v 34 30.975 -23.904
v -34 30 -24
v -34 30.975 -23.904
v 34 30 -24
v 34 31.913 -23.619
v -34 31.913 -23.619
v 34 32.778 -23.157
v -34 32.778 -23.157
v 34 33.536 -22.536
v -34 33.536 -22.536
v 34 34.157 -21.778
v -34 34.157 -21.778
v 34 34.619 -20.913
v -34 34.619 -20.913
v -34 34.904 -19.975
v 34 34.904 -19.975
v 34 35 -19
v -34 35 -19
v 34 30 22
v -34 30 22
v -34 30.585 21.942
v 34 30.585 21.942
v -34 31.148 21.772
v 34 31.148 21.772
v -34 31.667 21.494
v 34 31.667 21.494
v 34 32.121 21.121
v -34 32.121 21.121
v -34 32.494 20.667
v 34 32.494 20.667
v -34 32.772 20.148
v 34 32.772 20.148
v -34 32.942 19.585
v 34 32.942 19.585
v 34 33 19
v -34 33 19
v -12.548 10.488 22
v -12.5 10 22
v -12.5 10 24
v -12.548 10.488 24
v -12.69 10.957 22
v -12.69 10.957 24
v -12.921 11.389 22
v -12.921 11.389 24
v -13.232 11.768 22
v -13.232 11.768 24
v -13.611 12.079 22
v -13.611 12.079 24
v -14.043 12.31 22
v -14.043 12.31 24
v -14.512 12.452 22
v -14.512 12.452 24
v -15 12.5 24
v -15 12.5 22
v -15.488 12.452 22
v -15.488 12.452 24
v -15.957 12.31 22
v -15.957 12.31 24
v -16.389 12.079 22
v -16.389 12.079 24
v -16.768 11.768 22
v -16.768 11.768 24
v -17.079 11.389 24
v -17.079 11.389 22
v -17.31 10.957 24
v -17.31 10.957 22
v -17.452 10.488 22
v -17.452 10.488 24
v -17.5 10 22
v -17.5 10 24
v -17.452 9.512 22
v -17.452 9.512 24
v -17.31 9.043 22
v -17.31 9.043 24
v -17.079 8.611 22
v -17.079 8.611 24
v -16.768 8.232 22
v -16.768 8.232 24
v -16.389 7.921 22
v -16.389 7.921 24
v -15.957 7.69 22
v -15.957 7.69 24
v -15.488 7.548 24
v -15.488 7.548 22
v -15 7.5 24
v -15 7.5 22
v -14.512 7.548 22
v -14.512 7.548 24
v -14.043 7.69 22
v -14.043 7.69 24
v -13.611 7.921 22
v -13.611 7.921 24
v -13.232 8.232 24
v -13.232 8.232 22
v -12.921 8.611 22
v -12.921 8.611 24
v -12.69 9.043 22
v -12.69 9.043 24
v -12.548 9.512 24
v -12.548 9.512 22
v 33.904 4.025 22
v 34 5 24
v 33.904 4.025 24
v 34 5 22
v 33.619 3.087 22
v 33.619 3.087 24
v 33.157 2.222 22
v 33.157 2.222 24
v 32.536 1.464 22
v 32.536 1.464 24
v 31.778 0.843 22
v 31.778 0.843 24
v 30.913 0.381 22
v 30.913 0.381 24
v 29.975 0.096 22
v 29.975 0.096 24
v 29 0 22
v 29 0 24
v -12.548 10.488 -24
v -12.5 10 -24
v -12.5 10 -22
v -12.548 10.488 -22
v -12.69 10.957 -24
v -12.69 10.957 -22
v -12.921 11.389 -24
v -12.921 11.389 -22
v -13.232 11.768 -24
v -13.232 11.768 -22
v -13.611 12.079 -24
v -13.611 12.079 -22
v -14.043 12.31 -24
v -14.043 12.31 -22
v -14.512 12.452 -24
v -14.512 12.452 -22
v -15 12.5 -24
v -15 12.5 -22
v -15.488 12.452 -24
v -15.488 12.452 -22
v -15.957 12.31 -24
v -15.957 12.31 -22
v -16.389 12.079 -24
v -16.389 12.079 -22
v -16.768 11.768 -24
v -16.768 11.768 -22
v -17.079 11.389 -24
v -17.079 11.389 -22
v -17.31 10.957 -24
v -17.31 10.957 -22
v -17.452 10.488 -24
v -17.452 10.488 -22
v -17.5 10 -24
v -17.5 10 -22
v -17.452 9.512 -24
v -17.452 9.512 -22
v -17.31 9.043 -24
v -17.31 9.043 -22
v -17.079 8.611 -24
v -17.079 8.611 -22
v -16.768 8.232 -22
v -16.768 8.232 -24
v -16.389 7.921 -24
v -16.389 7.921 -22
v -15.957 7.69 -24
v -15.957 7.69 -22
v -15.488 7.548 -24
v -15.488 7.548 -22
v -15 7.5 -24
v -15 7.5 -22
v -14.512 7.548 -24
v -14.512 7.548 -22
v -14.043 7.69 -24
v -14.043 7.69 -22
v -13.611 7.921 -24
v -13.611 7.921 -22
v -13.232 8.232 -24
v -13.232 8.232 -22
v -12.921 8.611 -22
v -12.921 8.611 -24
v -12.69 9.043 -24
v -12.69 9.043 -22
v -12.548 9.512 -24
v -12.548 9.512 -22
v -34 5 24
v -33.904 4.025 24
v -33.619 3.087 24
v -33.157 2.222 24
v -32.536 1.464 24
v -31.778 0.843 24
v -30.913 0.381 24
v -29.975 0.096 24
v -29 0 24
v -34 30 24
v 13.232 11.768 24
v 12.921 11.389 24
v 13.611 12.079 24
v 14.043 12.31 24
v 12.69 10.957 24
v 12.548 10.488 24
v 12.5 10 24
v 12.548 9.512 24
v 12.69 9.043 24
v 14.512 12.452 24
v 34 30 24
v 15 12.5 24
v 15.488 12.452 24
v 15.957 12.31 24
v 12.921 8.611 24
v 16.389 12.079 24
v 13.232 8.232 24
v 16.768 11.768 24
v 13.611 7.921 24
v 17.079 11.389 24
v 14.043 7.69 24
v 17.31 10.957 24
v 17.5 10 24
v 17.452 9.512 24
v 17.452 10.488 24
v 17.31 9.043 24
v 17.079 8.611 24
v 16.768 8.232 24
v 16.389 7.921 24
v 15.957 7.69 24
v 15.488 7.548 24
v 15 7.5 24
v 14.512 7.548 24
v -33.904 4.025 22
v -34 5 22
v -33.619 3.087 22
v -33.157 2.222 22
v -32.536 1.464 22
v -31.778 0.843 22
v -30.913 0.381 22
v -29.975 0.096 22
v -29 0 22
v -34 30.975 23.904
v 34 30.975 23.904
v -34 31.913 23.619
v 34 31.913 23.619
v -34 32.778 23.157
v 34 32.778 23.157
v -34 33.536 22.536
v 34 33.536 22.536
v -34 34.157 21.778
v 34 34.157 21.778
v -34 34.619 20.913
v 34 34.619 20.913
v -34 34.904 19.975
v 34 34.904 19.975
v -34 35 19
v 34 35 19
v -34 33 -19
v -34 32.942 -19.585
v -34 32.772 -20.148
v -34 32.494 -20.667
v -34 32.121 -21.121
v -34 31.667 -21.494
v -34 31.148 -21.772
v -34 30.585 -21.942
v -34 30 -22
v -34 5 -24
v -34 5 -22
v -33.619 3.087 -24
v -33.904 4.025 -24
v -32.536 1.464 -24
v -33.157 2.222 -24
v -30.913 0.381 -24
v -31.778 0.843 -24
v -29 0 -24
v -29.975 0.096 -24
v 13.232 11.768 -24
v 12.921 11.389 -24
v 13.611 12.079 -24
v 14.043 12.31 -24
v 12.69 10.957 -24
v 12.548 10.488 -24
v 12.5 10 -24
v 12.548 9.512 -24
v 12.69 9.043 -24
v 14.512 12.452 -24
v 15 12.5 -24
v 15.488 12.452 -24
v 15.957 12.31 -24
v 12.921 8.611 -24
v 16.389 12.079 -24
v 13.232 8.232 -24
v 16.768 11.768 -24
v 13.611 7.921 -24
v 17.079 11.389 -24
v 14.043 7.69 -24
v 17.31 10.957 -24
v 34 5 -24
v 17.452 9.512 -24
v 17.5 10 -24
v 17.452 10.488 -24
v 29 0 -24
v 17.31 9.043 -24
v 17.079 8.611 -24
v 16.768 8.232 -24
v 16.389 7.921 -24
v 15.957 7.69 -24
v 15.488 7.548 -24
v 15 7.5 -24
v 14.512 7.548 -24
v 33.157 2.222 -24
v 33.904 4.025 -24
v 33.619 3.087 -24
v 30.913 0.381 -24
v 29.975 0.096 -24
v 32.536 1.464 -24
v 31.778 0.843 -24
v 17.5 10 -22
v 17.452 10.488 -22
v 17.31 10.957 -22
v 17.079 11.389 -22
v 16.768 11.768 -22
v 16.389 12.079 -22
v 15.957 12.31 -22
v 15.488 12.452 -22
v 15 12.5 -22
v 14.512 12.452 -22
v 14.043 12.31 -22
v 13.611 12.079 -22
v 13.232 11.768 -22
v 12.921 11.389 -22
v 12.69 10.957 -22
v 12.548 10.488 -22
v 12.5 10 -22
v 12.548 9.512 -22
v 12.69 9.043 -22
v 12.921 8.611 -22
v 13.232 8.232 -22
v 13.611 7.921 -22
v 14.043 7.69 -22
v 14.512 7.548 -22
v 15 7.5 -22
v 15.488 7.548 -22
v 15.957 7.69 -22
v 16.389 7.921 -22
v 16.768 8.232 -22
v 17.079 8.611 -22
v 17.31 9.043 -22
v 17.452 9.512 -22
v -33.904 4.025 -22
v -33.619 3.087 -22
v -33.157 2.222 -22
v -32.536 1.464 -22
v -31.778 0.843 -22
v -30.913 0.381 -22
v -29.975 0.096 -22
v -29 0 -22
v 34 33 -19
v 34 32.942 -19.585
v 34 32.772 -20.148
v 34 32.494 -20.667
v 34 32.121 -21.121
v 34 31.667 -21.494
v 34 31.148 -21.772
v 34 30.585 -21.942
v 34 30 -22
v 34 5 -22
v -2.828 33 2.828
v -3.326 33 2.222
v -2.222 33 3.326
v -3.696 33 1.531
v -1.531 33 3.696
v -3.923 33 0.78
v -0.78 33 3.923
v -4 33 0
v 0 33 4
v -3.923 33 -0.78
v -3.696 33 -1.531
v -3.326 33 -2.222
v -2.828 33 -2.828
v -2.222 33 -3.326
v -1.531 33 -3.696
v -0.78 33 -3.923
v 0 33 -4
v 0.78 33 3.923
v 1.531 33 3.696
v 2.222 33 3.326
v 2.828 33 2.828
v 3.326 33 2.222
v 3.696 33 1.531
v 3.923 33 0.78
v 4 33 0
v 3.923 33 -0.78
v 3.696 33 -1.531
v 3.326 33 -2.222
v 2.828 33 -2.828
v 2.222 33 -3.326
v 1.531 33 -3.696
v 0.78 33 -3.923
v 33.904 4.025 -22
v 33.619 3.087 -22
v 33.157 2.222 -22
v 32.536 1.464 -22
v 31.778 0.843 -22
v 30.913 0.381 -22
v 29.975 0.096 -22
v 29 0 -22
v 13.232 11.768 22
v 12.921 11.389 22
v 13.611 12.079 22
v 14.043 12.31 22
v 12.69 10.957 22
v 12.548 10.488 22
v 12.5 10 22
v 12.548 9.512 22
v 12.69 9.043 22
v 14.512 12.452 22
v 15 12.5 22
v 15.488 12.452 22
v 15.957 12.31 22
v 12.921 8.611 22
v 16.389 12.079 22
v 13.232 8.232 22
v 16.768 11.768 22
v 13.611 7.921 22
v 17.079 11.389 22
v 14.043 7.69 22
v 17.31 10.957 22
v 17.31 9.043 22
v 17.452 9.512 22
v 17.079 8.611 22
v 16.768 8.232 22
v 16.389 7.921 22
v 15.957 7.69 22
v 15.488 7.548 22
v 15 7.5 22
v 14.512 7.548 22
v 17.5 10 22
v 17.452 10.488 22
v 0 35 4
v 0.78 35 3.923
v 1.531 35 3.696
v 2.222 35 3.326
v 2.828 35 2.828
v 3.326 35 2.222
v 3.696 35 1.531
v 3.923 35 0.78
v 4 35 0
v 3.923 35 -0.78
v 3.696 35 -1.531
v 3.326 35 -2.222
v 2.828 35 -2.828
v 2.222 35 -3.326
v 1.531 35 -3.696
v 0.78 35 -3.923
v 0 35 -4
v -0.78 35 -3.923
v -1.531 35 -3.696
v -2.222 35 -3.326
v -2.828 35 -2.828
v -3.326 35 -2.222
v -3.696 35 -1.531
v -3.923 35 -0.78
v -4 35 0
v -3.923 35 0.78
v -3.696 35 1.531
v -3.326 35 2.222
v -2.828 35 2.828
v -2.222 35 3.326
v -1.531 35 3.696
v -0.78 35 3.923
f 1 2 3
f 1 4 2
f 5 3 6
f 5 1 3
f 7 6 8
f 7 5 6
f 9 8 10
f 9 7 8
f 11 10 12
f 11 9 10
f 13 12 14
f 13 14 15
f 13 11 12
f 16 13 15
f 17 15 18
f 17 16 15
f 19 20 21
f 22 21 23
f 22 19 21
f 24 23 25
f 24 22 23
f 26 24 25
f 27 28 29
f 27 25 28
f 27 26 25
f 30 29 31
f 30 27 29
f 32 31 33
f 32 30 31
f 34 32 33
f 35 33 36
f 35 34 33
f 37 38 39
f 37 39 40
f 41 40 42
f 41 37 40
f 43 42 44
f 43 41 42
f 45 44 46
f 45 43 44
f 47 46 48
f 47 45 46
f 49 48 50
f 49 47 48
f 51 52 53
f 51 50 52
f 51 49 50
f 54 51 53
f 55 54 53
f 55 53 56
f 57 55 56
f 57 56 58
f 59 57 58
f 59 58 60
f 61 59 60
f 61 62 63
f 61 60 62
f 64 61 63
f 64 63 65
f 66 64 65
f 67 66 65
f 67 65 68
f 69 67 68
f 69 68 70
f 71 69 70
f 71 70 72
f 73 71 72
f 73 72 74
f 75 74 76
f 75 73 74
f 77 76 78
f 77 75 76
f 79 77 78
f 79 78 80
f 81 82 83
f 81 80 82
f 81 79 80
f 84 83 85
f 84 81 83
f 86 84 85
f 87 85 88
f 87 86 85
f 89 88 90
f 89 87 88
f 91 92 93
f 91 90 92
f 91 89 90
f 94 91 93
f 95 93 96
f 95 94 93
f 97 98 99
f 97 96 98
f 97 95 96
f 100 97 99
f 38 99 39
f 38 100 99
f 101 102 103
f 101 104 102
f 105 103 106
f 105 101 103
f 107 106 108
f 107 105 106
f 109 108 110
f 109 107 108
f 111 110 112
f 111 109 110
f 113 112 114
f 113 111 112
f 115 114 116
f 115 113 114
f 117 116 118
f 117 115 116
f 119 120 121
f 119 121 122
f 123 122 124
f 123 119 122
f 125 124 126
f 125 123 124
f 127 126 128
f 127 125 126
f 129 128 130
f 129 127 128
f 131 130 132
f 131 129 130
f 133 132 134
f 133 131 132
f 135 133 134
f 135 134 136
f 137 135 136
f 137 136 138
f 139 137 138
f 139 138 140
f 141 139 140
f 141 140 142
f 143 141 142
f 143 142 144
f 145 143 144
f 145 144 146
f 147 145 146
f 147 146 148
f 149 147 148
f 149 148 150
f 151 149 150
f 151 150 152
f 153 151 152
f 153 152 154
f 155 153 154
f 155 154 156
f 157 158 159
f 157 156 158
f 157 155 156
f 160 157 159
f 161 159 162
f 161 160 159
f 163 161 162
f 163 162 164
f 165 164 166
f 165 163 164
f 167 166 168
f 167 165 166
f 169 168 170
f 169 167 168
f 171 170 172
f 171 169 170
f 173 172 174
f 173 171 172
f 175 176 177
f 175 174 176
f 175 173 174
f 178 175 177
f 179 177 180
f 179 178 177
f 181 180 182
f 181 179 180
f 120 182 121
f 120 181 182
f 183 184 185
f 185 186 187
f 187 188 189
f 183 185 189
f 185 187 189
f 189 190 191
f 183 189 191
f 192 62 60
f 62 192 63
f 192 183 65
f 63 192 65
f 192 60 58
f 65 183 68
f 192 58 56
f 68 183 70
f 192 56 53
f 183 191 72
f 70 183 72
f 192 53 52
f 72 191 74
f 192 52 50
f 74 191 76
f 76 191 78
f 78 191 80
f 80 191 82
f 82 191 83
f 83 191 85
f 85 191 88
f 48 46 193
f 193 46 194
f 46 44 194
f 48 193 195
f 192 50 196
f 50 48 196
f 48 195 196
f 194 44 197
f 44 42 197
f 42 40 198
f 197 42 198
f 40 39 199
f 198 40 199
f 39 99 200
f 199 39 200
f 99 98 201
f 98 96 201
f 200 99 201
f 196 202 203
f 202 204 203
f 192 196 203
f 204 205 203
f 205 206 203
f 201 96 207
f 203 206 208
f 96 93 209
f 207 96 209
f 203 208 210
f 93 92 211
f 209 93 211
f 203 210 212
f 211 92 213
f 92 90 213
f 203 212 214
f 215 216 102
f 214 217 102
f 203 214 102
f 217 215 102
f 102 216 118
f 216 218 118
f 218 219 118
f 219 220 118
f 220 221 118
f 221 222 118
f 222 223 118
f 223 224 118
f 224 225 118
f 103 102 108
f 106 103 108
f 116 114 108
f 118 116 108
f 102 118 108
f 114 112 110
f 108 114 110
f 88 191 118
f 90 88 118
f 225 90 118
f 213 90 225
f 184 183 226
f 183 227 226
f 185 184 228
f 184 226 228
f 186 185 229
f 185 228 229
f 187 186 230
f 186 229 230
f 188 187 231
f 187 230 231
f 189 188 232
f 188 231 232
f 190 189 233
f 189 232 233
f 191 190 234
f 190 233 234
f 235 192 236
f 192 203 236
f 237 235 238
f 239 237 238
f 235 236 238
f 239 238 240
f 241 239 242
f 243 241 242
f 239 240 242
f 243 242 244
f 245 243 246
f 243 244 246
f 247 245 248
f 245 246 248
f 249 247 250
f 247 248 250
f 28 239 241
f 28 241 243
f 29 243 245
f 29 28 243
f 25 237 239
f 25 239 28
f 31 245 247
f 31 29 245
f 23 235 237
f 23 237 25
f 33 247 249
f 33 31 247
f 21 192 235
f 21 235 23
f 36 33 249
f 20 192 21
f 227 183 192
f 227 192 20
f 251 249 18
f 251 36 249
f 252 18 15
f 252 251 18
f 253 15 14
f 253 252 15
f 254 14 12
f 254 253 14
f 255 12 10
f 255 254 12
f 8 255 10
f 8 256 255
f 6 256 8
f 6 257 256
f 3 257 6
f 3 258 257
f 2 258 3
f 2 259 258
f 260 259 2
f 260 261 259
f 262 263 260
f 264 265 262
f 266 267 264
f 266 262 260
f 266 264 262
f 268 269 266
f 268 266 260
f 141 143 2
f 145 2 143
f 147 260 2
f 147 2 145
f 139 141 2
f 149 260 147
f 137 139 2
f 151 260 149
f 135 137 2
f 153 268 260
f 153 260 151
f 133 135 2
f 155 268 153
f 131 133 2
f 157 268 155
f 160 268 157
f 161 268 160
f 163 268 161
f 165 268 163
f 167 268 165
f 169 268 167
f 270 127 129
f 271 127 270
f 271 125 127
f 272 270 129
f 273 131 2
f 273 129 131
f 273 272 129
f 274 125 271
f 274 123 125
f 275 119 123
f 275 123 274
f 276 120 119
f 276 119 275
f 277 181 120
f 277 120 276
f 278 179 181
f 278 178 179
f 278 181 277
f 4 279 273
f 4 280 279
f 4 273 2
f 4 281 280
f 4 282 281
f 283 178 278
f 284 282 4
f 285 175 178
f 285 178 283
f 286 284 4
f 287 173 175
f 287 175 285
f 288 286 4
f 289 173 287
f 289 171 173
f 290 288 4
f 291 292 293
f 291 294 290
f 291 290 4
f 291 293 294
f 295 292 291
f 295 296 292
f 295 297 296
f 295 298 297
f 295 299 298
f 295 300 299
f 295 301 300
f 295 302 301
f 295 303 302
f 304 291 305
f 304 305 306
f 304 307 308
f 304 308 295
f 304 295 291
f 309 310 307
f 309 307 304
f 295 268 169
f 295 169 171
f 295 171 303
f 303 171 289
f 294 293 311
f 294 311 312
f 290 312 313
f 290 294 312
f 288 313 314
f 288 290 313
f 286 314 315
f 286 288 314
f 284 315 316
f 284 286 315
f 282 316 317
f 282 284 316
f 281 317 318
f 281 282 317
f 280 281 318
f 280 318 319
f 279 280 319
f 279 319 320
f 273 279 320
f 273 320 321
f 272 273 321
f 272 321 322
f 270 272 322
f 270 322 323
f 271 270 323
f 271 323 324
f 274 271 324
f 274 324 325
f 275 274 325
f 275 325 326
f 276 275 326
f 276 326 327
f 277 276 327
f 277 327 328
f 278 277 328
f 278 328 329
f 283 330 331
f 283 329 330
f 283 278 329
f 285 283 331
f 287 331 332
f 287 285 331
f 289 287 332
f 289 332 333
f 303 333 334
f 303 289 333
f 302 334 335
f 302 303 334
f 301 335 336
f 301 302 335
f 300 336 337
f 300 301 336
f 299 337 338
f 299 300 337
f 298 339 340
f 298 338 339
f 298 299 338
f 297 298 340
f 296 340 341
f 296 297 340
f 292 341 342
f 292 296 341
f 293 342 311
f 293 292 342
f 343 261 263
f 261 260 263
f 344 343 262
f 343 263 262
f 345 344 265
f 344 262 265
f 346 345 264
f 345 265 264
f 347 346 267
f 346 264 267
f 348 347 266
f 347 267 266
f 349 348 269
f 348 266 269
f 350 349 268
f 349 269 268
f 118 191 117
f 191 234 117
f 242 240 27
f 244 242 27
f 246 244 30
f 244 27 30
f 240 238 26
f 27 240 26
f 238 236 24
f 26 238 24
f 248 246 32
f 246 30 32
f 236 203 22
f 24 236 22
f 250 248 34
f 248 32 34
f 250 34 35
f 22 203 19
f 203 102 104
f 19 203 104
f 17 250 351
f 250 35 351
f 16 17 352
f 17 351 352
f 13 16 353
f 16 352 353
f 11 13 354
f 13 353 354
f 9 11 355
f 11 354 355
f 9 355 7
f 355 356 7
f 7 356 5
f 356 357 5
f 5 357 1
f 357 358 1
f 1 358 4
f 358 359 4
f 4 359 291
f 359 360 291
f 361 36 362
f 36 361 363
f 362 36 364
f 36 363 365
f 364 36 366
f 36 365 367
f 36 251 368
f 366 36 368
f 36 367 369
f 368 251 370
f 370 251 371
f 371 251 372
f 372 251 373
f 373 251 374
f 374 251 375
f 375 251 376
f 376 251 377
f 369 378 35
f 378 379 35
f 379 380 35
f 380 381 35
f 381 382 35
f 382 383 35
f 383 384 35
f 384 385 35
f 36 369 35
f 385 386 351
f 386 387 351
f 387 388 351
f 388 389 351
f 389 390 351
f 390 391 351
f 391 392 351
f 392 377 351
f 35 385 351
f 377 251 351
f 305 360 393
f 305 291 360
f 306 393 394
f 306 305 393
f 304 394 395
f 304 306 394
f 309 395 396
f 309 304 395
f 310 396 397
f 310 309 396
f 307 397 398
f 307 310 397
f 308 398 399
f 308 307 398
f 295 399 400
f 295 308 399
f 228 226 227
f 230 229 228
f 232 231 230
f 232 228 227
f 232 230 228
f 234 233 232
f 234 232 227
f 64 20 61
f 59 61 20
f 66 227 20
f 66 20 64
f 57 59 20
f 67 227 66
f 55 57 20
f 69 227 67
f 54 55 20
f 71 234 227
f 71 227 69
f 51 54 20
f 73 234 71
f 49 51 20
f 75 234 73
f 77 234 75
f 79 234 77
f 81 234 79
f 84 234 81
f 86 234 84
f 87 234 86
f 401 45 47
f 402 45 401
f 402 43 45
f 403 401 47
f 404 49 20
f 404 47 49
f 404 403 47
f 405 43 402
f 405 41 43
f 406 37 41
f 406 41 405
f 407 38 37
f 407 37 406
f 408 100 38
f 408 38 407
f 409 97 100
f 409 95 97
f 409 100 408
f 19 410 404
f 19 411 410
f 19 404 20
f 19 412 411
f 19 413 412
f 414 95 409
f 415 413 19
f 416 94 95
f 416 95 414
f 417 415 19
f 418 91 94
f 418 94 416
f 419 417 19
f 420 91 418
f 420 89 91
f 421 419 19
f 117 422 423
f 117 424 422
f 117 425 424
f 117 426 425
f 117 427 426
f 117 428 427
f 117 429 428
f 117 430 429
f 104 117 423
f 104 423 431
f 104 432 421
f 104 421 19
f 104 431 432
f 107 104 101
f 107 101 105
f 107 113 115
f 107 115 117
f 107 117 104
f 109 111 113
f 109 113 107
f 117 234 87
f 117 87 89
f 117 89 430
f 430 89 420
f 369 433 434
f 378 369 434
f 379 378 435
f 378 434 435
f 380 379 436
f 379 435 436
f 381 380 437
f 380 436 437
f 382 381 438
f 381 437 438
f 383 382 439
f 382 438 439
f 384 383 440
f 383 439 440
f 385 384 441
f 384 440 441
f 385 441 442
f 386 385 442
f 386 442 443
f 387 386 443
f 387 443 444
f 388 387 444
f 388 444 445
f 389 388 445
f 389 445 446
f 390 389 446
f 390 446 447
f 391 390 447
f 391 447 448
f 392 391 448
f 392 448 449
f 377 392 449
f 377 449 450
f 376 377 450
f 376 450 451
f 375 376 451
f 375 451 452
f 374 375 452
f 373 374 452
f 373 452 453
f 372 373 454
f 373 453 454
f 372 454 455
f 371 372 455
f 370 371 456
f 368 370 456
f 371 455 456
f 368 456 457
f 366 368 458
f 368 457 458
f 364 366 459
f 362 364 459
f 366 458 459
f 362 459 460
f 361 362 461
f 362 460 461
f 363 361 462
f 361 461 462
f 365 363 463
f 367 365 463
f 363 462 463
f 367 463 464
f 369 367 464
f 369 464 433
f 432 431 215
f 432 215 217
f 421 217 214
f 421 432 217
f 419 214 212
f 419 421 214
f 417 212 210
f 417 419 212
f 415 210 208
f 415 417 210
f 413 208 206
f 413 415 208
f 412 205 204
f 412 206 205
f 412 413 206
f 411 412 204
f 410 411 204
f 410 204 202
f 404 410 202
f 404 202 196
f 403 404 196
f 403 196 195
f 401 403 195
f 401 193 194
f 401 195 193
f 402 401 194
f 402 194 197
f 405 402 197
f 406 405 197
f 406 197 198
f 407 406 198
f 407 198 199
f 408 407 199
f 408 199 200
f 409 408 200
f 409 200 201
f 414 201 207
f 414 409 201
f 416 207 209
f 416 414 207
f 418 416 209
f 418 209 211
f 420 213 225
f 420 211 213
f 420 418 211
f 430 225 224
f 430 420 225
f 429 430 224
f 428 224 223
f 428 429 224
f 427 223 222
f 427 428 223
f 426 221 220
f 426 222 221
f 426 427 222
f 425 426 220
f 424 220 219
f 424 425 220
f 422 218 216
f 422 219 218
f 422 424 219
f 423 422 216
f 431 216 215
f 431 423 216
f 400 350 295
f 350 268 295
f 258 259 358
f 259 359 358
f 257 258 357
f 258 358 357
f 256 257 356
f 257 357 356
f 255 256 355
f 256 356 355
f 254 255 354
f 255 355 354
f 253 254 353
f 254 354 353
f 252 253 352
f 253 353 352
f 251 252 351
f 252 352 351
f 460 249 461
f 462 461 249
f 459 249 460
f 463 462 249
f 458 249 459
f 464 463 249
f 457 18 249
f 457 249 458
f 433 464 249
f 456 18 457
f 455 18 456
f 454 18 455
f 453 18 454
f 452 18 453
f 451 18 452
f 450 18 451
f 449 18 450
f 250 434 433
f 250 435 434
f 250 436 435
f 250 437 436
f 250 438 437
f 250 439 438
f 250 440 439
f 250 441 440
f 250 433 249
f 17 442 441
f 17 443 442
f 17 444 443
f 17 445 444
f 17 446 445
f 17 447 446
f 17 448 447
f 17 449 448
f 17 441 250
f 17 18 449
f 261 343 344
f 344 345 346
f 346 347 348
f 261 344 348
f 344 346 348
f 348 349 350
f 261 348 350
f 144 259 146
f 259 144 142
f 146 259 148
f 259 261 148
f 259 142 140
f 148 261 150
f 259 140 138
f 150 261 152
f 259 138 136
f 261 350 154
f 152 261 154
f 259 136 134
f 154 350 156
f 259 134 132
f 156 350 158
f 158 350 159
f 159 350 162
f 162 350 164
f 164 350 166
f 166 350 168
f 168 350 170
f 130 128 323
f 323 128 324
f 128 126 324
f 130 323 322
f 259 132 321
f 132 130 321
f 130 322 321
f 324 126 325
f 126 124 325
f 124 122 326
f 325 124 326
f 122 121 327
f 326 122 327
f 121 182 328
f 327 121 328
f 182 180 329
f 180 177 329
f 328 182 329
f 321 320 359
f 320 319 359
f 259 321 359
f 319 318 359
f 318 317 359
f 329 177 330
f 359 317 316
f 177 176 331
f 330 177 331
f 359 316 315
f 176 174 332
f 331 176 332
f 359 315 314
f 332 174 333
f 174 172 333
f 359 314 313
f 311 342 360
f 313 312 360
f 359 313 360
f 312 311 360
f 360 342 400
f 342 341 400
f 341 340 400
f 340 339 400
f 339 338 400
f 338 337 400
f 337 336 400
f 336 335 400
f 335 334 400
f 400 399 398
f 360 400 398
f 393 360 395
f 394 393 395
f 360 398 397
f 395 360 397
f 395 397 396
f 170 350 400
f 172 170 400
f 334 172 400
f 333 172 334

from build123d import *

# Parameters (mm, degrees)
SKETCH1_W                      = 68
SKETCH1_H                      = 48
BOSS_EXTRUDE1_DEPTH            = 35
SHELL1_T                       = -2
FILLET1_R                      = 5
FILLET2_R                      = 3
CUT_EXTRUDE1_REACH             = 80.467
CUT_EXTRUDE1_DIRECTION_2_REACH = 80.467
CUT_EXTRUDE2_DEPTH             = 55.378304497
CUT_EXTRUDE2_DEPTH_BACK        = 55.378304497
SKETCH3_R                      = 2.5
FILLET3_R                      = 5
SKETCH4_R                      = 4
CUT_EXTRUDE3_DEPTH             = 55.378304497


with BuildPart() as part:
    # Sketch1 → Boss-Extrude1 (new body)
    with BuildSketch(Plane(origin=(0, 0, 0), x_dir=(1, 0, 0), z_dir=(0, 1, 0))):
        Rectangle(SKETCH1_W, SKETCH1_H)
    extrude(amount=BOSS_EXTRUDE1_DEPTH)

    # Shell1
    shell1_openings = [part.faces().sort_by_distance(p)[0] for p in [
        (0, 0, 0),
    ]]
    offset(amount=SHELL1_T, openings=shell1_openings, kind=Kind.INTERSECTION)

    # Fillet1
    fillet1_edges = [part.edges().sort_by_distance(p)[0] for p in [
        (0, 35, 24),
        (0, 35, -24),
    ]]
    fillet(fillet1_edges, radius=FILLET1_R)

    # Fillet2
    fillet2_edges = [part.edges().sort_by_distance(p)[0] for p in [
        (0, 33, -22),
        (0, 33, 22),
    ]]
    fillet(fillet2_edges, radius=FILLET2_R)

    # Sketch2 → Cut-Extrude1 (cut, up to next)
    with BuildSketch(Plane(origin=(-32, 0, 0), x_dir=(0, 0, -1), z_dir=(1, 0, 0)), mode=Mode.PRIVATE) as cut_extrude1_sk1:
        with BuildLine():
            Line((22, 0), (22, 30))
            ThreePointArc((22, 30), (21.121320344, 32.121320344), (19, 33))
            Line((19, 33), (-19, 33))
            ThreePointArc((-19, 33), (-21.121320344, 32.121320344), (-22, 30))
            Line((-22, 30), (-22, 0))
            Line((-22, 0), (22, 0))
        make_face()
    cut_extrude1_tool1 = extrude(cut_extrude1_sk1.sketch, amount=-CUT_EXTRUDE1_REACH, mode=Mode.PRIVATE) & part.part
    add(cut_extrude1_tool1.solids().sort_by_distance((-32, 16.457775, 0))[0], mode=Mode.SUBTRACT)

    # Sketch2 → Cut-Extrude1 direction 2 (cut, up to next)
    with BuildSketch(Plane(origin=(-32, 0, 0), x_dir=(0, 0, -1), z_dir=(1, 0, 0)), mode=Mode.PRIVATE) as cut_extrude1_direction_2_sk1:
        with BuildLine():
            Line((22, 0), (22, 30))
            ThreePointArc((22, 30), (21.121320344, 32.121320344), (19, 33))
            Line((19, 33), (-19, 33))
            ThreePointArc((-19, 33), (-21.121320344, 32.121320344), (-22, 30))
            Line((-22, 30), (-22, 0))
            Line((-22, 0), (22, 0))
        make_face()
    cut_extrude1_direction_2_tool1 = extrude(cut_extrude1_direction_2_sk1.sketch, amount=CUT_EXTRUDE1_DIRECTION_2_REACH, mode=Mode.PRIVATE) & part.part
    add(cut_extrude1_direction_2_tool1.solids().sort_by_distance((-32, 16.457775, 0))[0], mode=Mode.SUBTRACT)

    # Sketch3 → Cut-Extrude2 (cut, two sides: drawn at the far end of the back side and taken through both)
    with BuildSketch(Plane.XY.offset(-CUT_EXTRUDE2_DEPTH_BACK)):
        with Locations((-15, 10)):
            Circle(SKETCH3_R)
        with Locations((15, 10)):
            Circle(SKETCH3_R)
    extrude(amount=CUT_EXTRUDE2_DEPTH + CUT_EXTRUDE2_DEPTH_BACK, mode=Mode.SUBTRACT)

    # Fillet3
    fillet3_edges = [part.edges().sort_by_distance(p)[0] for p in [
        (-34, 0, -23),
        (34, 0, -23),
        (-34, 0, 23),
        (34, 0, 23),
    ]]
    fillet(fillet3_edges, radius=FILLET3_R)

    # Sketch4 → Cut-Extrude3 (cut, through all)
    with BuildSketch(Plane(origin=(0, 35, 0), x_dir=(1, 0, 0), z_dir=(0, 1, 0))):
        with Locations(Location((0, 0, 0), (0, 0, 270))):
            Circle(SKETCH4_R)
    extrude(amount=-CUT_EXTRUDE3_DEPTH, mode=Mode.SUBTRACT)


solid = part.part
